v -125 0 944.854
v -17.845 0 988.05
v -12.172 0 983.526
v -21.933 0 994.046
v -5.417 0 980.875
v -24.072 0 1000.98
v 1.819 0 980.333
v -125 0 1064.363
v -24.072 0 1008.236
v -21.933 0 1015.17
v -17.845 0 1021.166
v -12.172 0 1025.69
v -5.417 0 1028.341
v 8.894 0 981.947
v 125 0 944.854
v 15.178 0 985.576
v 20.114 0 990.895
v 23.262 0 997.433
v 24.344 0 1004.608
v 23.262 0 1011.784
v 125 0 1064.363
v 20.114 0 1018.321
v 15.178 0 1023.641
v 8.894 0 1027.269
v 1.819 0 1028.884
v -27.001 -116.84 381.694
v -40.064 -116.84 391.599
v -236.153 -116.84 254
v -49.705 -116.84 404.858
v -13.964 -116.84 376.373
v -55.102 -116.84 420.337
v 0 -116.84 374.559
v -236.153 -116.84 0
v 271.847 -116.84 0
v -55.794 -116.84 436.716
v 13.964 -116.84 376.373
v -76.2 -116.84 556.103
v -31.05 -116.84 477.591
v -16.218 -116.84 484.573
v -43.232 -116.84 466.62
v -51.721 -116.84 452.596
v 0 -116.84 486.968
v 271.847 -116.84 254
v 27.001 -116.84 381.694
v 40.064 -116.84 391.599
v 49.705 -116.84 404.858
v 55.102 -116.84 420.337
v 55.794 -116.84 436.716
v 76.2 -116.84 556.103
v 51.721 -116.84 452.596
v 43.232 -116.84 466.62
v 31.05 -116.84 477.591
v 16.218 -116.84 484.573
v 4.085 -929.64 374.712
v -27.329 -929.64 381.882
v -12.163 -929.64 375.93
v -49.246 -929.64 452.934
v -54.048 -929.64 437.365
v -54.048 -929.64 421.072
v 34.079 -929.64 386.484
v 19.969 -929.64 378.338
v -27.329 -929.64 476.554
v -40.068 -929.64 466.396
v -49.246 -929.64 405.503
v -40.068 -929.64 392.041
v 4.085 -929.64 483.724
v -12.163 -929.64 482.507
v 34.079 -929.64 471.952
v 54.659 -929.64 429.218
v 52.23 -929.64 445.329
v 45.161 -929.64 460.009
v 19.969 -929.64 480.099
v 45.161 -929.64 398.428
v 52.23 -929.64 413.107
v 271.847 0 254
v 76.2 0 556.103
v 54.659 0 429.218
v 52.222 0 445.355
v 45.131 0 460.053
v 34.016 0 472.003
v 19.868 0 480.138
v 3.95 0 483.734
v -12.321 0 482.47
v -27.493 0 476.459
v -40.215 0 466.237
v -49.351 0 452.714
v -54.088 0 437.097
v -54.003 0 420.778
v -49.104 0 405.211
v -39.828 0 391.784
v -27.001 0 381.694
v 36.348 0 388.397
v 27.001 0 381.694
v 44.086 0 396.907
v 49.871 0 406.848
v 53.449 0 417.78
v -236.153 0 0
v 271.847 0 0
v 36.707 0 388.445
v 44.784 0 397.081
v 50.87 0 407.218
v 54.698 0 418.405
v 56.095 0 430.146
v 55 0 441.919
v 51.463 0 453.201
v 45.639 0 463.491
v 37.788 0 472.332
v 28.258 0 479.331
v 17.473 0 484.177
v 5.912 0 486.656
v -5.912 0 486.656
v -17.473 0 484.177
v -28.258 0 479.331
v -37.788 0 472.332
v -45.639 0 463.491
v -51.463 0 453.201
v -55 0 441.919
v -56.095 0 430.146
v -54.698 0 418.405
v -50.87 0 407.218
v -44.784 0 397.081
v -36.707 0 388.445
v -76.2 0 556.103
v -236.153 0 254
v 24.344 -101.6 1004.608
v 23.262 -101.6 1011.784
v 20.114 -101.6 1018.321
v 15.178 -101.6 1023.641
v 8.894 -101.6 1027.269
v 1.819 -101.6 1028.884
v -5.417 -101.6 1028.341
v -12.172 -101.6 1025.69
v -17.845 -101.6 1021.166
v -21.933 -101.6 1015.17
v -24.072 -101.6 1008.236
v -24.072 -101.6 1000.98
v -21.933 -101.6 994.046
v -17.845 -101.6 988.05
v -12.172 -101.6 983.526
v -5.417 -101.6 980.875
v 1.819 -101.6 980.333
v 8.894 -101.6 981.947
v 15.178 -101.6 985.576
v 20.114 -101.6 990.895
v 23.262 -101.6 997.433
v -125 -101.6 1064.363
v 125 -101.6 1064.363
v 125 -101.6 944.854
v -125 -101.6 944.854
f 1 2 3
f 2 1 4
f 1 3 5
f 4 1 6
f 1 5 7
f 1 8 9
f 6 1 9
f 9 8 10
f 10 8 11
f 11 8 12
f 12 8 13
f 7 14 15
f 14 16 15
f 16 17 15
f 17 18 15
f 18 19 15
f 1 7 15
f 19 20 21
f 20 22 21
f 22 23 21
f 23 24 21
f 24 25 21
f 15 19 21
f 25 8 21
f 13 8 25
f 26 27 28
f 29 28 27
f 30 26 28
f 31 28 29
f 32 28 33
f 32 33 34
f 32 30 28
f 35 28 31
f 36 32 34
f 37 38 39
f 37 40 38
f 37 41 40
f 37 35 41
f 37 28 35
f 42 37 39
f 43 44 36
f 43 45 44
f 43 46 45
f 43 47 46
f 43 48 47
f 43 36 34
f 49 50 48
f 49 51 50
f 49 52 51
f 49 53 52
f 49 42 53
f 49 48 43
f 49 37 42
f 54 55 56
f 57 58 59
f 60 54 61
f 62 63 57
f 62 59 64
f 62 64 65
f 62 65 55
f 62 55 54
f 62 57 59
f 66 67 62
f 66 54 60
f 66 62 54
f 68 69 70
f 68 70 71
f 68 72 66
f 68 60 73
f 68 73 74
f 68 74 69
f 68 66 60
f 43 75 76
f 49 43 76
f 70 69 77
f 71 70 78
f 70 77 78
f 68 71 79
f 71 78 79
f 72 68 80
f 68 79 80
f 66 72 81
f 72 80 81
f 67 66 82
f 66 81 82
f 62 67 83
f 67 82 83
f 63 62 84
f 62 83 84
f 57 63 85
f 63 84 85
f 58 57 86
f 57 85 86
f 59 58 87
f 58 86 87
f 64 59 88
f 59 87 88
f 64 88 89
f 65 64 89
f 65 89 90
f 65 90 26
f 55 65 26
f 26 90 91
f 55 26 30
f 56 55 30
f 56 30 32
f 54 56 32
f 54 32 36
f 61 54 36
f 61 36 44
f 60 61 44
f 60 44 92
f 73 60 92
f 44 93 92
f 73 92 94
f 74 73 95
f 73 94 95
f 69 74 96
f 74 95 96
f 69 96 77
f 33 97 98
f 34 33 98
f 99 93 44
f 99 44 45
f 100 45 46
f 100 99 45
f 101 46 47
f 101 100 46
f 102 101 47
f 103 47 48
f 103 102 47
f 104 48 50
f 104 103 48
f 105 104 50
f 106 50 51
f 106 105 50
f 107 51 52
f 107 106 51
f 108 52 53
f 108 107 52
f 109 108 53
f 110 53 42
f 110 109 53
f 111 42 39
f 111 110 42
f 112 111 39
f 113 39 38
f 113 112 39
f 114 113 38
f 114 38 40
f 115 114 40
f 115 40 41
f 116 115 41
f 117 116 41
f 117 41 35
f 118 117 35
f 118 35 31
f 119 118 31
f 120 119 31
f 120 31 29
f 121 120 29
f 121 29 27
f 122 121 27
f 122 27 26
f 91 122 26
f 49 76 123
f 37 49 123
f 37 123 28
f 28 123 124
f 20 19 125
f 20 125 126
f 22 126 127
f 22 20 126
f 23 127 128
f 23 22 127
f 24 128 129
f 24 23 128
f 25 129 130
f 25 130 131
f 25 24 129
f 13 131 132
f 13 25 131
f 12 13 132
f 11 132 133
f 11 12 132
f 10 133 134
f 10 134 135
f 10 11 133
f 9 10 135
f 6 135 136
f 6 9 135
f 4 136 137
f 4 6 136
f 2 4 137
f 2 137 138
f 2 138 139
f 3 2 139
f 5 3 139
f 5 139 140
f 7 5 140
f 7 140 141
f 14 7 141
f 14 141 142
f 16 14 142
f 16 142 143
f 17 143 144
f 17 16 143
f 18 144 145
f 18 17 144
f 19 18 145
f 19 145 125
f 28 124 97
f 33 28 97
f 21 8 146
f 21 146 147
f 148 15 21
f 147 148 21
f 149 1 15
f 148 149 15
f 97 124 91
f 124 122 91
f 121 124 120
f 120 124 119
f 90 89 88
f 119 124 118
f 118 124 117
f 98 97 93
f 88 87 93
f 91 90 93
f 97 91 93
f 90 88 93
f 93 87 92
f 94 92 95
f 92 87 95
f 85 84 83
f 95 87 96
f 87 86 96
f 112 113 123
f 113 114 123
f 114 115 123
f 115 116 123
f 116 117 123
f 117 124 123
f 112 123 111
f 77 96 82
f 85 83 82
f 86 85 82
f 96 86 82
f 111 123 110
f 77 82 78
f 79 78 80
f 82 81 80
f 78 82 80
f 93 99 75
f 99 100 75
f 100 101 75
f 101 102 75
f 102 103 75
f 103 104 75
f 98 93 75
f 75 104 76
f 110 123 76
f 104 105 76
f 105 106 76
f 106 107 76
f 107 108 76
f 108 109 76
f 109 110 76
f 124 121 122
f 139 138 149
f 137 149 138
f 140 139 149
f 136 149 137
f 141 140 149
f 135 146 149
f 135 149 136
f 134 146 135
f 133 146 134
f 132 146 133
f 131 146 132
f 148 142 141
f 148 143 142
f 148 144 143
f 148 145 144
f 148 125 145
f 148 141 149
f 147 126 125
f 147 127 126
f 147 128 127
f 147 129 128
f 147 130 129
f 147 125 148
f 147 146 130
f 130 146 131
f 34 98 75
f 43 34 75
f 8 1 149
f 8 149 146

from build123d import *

# Parameters (mm, degrees)
F0_R     = 56.099534
F1_DEPTH = 116.84
F2_R     = 54.658774
F3_DEPTH = 929.64
F4_W     = 250
F4_H     = 119.508714
F4_R     = 24.343568
F5_DEPTH = 101.6


with BuildPart() as f1:
    # F0 (on Front) → F1 (new body)
    with BuildSketch(Plane.XZ):
        Polygon((-236.152576, 254), (-236.152576, 0), (271.847424, 0), (271.847424, 254), (76.2, 556.103408), (0, 556.103408), (-76.2, 556.103408), align=None)
        with Locations((0, 430.868447)):
            Circle(F0_R, mode=Mode.SUBTRACT)
    extrude(amount=F1_DEPTH)

    # F2 (on Front) → F3 (join)
    with BuildSketch(Plane.XZ):
        with Locations((0, 429.218203)):
            Circle(F2_R)
    extrude(amount=F3_DEPTH)


with BuildPart() as f5:
    # F4 (on Front) → F5 (new body)
    with BuildSketch(Plane.XZ):
        with Locations((0, 1004.608154)):
            Rectangle(F4_W, F4_H)
        with Locations((0, 1004.608154)):
            Circle(F4_R, mode=Mode.SUBTRACT)
    extrude(amount=F5_DEPTH)


solid = Compound([f1.part, f5.part])
